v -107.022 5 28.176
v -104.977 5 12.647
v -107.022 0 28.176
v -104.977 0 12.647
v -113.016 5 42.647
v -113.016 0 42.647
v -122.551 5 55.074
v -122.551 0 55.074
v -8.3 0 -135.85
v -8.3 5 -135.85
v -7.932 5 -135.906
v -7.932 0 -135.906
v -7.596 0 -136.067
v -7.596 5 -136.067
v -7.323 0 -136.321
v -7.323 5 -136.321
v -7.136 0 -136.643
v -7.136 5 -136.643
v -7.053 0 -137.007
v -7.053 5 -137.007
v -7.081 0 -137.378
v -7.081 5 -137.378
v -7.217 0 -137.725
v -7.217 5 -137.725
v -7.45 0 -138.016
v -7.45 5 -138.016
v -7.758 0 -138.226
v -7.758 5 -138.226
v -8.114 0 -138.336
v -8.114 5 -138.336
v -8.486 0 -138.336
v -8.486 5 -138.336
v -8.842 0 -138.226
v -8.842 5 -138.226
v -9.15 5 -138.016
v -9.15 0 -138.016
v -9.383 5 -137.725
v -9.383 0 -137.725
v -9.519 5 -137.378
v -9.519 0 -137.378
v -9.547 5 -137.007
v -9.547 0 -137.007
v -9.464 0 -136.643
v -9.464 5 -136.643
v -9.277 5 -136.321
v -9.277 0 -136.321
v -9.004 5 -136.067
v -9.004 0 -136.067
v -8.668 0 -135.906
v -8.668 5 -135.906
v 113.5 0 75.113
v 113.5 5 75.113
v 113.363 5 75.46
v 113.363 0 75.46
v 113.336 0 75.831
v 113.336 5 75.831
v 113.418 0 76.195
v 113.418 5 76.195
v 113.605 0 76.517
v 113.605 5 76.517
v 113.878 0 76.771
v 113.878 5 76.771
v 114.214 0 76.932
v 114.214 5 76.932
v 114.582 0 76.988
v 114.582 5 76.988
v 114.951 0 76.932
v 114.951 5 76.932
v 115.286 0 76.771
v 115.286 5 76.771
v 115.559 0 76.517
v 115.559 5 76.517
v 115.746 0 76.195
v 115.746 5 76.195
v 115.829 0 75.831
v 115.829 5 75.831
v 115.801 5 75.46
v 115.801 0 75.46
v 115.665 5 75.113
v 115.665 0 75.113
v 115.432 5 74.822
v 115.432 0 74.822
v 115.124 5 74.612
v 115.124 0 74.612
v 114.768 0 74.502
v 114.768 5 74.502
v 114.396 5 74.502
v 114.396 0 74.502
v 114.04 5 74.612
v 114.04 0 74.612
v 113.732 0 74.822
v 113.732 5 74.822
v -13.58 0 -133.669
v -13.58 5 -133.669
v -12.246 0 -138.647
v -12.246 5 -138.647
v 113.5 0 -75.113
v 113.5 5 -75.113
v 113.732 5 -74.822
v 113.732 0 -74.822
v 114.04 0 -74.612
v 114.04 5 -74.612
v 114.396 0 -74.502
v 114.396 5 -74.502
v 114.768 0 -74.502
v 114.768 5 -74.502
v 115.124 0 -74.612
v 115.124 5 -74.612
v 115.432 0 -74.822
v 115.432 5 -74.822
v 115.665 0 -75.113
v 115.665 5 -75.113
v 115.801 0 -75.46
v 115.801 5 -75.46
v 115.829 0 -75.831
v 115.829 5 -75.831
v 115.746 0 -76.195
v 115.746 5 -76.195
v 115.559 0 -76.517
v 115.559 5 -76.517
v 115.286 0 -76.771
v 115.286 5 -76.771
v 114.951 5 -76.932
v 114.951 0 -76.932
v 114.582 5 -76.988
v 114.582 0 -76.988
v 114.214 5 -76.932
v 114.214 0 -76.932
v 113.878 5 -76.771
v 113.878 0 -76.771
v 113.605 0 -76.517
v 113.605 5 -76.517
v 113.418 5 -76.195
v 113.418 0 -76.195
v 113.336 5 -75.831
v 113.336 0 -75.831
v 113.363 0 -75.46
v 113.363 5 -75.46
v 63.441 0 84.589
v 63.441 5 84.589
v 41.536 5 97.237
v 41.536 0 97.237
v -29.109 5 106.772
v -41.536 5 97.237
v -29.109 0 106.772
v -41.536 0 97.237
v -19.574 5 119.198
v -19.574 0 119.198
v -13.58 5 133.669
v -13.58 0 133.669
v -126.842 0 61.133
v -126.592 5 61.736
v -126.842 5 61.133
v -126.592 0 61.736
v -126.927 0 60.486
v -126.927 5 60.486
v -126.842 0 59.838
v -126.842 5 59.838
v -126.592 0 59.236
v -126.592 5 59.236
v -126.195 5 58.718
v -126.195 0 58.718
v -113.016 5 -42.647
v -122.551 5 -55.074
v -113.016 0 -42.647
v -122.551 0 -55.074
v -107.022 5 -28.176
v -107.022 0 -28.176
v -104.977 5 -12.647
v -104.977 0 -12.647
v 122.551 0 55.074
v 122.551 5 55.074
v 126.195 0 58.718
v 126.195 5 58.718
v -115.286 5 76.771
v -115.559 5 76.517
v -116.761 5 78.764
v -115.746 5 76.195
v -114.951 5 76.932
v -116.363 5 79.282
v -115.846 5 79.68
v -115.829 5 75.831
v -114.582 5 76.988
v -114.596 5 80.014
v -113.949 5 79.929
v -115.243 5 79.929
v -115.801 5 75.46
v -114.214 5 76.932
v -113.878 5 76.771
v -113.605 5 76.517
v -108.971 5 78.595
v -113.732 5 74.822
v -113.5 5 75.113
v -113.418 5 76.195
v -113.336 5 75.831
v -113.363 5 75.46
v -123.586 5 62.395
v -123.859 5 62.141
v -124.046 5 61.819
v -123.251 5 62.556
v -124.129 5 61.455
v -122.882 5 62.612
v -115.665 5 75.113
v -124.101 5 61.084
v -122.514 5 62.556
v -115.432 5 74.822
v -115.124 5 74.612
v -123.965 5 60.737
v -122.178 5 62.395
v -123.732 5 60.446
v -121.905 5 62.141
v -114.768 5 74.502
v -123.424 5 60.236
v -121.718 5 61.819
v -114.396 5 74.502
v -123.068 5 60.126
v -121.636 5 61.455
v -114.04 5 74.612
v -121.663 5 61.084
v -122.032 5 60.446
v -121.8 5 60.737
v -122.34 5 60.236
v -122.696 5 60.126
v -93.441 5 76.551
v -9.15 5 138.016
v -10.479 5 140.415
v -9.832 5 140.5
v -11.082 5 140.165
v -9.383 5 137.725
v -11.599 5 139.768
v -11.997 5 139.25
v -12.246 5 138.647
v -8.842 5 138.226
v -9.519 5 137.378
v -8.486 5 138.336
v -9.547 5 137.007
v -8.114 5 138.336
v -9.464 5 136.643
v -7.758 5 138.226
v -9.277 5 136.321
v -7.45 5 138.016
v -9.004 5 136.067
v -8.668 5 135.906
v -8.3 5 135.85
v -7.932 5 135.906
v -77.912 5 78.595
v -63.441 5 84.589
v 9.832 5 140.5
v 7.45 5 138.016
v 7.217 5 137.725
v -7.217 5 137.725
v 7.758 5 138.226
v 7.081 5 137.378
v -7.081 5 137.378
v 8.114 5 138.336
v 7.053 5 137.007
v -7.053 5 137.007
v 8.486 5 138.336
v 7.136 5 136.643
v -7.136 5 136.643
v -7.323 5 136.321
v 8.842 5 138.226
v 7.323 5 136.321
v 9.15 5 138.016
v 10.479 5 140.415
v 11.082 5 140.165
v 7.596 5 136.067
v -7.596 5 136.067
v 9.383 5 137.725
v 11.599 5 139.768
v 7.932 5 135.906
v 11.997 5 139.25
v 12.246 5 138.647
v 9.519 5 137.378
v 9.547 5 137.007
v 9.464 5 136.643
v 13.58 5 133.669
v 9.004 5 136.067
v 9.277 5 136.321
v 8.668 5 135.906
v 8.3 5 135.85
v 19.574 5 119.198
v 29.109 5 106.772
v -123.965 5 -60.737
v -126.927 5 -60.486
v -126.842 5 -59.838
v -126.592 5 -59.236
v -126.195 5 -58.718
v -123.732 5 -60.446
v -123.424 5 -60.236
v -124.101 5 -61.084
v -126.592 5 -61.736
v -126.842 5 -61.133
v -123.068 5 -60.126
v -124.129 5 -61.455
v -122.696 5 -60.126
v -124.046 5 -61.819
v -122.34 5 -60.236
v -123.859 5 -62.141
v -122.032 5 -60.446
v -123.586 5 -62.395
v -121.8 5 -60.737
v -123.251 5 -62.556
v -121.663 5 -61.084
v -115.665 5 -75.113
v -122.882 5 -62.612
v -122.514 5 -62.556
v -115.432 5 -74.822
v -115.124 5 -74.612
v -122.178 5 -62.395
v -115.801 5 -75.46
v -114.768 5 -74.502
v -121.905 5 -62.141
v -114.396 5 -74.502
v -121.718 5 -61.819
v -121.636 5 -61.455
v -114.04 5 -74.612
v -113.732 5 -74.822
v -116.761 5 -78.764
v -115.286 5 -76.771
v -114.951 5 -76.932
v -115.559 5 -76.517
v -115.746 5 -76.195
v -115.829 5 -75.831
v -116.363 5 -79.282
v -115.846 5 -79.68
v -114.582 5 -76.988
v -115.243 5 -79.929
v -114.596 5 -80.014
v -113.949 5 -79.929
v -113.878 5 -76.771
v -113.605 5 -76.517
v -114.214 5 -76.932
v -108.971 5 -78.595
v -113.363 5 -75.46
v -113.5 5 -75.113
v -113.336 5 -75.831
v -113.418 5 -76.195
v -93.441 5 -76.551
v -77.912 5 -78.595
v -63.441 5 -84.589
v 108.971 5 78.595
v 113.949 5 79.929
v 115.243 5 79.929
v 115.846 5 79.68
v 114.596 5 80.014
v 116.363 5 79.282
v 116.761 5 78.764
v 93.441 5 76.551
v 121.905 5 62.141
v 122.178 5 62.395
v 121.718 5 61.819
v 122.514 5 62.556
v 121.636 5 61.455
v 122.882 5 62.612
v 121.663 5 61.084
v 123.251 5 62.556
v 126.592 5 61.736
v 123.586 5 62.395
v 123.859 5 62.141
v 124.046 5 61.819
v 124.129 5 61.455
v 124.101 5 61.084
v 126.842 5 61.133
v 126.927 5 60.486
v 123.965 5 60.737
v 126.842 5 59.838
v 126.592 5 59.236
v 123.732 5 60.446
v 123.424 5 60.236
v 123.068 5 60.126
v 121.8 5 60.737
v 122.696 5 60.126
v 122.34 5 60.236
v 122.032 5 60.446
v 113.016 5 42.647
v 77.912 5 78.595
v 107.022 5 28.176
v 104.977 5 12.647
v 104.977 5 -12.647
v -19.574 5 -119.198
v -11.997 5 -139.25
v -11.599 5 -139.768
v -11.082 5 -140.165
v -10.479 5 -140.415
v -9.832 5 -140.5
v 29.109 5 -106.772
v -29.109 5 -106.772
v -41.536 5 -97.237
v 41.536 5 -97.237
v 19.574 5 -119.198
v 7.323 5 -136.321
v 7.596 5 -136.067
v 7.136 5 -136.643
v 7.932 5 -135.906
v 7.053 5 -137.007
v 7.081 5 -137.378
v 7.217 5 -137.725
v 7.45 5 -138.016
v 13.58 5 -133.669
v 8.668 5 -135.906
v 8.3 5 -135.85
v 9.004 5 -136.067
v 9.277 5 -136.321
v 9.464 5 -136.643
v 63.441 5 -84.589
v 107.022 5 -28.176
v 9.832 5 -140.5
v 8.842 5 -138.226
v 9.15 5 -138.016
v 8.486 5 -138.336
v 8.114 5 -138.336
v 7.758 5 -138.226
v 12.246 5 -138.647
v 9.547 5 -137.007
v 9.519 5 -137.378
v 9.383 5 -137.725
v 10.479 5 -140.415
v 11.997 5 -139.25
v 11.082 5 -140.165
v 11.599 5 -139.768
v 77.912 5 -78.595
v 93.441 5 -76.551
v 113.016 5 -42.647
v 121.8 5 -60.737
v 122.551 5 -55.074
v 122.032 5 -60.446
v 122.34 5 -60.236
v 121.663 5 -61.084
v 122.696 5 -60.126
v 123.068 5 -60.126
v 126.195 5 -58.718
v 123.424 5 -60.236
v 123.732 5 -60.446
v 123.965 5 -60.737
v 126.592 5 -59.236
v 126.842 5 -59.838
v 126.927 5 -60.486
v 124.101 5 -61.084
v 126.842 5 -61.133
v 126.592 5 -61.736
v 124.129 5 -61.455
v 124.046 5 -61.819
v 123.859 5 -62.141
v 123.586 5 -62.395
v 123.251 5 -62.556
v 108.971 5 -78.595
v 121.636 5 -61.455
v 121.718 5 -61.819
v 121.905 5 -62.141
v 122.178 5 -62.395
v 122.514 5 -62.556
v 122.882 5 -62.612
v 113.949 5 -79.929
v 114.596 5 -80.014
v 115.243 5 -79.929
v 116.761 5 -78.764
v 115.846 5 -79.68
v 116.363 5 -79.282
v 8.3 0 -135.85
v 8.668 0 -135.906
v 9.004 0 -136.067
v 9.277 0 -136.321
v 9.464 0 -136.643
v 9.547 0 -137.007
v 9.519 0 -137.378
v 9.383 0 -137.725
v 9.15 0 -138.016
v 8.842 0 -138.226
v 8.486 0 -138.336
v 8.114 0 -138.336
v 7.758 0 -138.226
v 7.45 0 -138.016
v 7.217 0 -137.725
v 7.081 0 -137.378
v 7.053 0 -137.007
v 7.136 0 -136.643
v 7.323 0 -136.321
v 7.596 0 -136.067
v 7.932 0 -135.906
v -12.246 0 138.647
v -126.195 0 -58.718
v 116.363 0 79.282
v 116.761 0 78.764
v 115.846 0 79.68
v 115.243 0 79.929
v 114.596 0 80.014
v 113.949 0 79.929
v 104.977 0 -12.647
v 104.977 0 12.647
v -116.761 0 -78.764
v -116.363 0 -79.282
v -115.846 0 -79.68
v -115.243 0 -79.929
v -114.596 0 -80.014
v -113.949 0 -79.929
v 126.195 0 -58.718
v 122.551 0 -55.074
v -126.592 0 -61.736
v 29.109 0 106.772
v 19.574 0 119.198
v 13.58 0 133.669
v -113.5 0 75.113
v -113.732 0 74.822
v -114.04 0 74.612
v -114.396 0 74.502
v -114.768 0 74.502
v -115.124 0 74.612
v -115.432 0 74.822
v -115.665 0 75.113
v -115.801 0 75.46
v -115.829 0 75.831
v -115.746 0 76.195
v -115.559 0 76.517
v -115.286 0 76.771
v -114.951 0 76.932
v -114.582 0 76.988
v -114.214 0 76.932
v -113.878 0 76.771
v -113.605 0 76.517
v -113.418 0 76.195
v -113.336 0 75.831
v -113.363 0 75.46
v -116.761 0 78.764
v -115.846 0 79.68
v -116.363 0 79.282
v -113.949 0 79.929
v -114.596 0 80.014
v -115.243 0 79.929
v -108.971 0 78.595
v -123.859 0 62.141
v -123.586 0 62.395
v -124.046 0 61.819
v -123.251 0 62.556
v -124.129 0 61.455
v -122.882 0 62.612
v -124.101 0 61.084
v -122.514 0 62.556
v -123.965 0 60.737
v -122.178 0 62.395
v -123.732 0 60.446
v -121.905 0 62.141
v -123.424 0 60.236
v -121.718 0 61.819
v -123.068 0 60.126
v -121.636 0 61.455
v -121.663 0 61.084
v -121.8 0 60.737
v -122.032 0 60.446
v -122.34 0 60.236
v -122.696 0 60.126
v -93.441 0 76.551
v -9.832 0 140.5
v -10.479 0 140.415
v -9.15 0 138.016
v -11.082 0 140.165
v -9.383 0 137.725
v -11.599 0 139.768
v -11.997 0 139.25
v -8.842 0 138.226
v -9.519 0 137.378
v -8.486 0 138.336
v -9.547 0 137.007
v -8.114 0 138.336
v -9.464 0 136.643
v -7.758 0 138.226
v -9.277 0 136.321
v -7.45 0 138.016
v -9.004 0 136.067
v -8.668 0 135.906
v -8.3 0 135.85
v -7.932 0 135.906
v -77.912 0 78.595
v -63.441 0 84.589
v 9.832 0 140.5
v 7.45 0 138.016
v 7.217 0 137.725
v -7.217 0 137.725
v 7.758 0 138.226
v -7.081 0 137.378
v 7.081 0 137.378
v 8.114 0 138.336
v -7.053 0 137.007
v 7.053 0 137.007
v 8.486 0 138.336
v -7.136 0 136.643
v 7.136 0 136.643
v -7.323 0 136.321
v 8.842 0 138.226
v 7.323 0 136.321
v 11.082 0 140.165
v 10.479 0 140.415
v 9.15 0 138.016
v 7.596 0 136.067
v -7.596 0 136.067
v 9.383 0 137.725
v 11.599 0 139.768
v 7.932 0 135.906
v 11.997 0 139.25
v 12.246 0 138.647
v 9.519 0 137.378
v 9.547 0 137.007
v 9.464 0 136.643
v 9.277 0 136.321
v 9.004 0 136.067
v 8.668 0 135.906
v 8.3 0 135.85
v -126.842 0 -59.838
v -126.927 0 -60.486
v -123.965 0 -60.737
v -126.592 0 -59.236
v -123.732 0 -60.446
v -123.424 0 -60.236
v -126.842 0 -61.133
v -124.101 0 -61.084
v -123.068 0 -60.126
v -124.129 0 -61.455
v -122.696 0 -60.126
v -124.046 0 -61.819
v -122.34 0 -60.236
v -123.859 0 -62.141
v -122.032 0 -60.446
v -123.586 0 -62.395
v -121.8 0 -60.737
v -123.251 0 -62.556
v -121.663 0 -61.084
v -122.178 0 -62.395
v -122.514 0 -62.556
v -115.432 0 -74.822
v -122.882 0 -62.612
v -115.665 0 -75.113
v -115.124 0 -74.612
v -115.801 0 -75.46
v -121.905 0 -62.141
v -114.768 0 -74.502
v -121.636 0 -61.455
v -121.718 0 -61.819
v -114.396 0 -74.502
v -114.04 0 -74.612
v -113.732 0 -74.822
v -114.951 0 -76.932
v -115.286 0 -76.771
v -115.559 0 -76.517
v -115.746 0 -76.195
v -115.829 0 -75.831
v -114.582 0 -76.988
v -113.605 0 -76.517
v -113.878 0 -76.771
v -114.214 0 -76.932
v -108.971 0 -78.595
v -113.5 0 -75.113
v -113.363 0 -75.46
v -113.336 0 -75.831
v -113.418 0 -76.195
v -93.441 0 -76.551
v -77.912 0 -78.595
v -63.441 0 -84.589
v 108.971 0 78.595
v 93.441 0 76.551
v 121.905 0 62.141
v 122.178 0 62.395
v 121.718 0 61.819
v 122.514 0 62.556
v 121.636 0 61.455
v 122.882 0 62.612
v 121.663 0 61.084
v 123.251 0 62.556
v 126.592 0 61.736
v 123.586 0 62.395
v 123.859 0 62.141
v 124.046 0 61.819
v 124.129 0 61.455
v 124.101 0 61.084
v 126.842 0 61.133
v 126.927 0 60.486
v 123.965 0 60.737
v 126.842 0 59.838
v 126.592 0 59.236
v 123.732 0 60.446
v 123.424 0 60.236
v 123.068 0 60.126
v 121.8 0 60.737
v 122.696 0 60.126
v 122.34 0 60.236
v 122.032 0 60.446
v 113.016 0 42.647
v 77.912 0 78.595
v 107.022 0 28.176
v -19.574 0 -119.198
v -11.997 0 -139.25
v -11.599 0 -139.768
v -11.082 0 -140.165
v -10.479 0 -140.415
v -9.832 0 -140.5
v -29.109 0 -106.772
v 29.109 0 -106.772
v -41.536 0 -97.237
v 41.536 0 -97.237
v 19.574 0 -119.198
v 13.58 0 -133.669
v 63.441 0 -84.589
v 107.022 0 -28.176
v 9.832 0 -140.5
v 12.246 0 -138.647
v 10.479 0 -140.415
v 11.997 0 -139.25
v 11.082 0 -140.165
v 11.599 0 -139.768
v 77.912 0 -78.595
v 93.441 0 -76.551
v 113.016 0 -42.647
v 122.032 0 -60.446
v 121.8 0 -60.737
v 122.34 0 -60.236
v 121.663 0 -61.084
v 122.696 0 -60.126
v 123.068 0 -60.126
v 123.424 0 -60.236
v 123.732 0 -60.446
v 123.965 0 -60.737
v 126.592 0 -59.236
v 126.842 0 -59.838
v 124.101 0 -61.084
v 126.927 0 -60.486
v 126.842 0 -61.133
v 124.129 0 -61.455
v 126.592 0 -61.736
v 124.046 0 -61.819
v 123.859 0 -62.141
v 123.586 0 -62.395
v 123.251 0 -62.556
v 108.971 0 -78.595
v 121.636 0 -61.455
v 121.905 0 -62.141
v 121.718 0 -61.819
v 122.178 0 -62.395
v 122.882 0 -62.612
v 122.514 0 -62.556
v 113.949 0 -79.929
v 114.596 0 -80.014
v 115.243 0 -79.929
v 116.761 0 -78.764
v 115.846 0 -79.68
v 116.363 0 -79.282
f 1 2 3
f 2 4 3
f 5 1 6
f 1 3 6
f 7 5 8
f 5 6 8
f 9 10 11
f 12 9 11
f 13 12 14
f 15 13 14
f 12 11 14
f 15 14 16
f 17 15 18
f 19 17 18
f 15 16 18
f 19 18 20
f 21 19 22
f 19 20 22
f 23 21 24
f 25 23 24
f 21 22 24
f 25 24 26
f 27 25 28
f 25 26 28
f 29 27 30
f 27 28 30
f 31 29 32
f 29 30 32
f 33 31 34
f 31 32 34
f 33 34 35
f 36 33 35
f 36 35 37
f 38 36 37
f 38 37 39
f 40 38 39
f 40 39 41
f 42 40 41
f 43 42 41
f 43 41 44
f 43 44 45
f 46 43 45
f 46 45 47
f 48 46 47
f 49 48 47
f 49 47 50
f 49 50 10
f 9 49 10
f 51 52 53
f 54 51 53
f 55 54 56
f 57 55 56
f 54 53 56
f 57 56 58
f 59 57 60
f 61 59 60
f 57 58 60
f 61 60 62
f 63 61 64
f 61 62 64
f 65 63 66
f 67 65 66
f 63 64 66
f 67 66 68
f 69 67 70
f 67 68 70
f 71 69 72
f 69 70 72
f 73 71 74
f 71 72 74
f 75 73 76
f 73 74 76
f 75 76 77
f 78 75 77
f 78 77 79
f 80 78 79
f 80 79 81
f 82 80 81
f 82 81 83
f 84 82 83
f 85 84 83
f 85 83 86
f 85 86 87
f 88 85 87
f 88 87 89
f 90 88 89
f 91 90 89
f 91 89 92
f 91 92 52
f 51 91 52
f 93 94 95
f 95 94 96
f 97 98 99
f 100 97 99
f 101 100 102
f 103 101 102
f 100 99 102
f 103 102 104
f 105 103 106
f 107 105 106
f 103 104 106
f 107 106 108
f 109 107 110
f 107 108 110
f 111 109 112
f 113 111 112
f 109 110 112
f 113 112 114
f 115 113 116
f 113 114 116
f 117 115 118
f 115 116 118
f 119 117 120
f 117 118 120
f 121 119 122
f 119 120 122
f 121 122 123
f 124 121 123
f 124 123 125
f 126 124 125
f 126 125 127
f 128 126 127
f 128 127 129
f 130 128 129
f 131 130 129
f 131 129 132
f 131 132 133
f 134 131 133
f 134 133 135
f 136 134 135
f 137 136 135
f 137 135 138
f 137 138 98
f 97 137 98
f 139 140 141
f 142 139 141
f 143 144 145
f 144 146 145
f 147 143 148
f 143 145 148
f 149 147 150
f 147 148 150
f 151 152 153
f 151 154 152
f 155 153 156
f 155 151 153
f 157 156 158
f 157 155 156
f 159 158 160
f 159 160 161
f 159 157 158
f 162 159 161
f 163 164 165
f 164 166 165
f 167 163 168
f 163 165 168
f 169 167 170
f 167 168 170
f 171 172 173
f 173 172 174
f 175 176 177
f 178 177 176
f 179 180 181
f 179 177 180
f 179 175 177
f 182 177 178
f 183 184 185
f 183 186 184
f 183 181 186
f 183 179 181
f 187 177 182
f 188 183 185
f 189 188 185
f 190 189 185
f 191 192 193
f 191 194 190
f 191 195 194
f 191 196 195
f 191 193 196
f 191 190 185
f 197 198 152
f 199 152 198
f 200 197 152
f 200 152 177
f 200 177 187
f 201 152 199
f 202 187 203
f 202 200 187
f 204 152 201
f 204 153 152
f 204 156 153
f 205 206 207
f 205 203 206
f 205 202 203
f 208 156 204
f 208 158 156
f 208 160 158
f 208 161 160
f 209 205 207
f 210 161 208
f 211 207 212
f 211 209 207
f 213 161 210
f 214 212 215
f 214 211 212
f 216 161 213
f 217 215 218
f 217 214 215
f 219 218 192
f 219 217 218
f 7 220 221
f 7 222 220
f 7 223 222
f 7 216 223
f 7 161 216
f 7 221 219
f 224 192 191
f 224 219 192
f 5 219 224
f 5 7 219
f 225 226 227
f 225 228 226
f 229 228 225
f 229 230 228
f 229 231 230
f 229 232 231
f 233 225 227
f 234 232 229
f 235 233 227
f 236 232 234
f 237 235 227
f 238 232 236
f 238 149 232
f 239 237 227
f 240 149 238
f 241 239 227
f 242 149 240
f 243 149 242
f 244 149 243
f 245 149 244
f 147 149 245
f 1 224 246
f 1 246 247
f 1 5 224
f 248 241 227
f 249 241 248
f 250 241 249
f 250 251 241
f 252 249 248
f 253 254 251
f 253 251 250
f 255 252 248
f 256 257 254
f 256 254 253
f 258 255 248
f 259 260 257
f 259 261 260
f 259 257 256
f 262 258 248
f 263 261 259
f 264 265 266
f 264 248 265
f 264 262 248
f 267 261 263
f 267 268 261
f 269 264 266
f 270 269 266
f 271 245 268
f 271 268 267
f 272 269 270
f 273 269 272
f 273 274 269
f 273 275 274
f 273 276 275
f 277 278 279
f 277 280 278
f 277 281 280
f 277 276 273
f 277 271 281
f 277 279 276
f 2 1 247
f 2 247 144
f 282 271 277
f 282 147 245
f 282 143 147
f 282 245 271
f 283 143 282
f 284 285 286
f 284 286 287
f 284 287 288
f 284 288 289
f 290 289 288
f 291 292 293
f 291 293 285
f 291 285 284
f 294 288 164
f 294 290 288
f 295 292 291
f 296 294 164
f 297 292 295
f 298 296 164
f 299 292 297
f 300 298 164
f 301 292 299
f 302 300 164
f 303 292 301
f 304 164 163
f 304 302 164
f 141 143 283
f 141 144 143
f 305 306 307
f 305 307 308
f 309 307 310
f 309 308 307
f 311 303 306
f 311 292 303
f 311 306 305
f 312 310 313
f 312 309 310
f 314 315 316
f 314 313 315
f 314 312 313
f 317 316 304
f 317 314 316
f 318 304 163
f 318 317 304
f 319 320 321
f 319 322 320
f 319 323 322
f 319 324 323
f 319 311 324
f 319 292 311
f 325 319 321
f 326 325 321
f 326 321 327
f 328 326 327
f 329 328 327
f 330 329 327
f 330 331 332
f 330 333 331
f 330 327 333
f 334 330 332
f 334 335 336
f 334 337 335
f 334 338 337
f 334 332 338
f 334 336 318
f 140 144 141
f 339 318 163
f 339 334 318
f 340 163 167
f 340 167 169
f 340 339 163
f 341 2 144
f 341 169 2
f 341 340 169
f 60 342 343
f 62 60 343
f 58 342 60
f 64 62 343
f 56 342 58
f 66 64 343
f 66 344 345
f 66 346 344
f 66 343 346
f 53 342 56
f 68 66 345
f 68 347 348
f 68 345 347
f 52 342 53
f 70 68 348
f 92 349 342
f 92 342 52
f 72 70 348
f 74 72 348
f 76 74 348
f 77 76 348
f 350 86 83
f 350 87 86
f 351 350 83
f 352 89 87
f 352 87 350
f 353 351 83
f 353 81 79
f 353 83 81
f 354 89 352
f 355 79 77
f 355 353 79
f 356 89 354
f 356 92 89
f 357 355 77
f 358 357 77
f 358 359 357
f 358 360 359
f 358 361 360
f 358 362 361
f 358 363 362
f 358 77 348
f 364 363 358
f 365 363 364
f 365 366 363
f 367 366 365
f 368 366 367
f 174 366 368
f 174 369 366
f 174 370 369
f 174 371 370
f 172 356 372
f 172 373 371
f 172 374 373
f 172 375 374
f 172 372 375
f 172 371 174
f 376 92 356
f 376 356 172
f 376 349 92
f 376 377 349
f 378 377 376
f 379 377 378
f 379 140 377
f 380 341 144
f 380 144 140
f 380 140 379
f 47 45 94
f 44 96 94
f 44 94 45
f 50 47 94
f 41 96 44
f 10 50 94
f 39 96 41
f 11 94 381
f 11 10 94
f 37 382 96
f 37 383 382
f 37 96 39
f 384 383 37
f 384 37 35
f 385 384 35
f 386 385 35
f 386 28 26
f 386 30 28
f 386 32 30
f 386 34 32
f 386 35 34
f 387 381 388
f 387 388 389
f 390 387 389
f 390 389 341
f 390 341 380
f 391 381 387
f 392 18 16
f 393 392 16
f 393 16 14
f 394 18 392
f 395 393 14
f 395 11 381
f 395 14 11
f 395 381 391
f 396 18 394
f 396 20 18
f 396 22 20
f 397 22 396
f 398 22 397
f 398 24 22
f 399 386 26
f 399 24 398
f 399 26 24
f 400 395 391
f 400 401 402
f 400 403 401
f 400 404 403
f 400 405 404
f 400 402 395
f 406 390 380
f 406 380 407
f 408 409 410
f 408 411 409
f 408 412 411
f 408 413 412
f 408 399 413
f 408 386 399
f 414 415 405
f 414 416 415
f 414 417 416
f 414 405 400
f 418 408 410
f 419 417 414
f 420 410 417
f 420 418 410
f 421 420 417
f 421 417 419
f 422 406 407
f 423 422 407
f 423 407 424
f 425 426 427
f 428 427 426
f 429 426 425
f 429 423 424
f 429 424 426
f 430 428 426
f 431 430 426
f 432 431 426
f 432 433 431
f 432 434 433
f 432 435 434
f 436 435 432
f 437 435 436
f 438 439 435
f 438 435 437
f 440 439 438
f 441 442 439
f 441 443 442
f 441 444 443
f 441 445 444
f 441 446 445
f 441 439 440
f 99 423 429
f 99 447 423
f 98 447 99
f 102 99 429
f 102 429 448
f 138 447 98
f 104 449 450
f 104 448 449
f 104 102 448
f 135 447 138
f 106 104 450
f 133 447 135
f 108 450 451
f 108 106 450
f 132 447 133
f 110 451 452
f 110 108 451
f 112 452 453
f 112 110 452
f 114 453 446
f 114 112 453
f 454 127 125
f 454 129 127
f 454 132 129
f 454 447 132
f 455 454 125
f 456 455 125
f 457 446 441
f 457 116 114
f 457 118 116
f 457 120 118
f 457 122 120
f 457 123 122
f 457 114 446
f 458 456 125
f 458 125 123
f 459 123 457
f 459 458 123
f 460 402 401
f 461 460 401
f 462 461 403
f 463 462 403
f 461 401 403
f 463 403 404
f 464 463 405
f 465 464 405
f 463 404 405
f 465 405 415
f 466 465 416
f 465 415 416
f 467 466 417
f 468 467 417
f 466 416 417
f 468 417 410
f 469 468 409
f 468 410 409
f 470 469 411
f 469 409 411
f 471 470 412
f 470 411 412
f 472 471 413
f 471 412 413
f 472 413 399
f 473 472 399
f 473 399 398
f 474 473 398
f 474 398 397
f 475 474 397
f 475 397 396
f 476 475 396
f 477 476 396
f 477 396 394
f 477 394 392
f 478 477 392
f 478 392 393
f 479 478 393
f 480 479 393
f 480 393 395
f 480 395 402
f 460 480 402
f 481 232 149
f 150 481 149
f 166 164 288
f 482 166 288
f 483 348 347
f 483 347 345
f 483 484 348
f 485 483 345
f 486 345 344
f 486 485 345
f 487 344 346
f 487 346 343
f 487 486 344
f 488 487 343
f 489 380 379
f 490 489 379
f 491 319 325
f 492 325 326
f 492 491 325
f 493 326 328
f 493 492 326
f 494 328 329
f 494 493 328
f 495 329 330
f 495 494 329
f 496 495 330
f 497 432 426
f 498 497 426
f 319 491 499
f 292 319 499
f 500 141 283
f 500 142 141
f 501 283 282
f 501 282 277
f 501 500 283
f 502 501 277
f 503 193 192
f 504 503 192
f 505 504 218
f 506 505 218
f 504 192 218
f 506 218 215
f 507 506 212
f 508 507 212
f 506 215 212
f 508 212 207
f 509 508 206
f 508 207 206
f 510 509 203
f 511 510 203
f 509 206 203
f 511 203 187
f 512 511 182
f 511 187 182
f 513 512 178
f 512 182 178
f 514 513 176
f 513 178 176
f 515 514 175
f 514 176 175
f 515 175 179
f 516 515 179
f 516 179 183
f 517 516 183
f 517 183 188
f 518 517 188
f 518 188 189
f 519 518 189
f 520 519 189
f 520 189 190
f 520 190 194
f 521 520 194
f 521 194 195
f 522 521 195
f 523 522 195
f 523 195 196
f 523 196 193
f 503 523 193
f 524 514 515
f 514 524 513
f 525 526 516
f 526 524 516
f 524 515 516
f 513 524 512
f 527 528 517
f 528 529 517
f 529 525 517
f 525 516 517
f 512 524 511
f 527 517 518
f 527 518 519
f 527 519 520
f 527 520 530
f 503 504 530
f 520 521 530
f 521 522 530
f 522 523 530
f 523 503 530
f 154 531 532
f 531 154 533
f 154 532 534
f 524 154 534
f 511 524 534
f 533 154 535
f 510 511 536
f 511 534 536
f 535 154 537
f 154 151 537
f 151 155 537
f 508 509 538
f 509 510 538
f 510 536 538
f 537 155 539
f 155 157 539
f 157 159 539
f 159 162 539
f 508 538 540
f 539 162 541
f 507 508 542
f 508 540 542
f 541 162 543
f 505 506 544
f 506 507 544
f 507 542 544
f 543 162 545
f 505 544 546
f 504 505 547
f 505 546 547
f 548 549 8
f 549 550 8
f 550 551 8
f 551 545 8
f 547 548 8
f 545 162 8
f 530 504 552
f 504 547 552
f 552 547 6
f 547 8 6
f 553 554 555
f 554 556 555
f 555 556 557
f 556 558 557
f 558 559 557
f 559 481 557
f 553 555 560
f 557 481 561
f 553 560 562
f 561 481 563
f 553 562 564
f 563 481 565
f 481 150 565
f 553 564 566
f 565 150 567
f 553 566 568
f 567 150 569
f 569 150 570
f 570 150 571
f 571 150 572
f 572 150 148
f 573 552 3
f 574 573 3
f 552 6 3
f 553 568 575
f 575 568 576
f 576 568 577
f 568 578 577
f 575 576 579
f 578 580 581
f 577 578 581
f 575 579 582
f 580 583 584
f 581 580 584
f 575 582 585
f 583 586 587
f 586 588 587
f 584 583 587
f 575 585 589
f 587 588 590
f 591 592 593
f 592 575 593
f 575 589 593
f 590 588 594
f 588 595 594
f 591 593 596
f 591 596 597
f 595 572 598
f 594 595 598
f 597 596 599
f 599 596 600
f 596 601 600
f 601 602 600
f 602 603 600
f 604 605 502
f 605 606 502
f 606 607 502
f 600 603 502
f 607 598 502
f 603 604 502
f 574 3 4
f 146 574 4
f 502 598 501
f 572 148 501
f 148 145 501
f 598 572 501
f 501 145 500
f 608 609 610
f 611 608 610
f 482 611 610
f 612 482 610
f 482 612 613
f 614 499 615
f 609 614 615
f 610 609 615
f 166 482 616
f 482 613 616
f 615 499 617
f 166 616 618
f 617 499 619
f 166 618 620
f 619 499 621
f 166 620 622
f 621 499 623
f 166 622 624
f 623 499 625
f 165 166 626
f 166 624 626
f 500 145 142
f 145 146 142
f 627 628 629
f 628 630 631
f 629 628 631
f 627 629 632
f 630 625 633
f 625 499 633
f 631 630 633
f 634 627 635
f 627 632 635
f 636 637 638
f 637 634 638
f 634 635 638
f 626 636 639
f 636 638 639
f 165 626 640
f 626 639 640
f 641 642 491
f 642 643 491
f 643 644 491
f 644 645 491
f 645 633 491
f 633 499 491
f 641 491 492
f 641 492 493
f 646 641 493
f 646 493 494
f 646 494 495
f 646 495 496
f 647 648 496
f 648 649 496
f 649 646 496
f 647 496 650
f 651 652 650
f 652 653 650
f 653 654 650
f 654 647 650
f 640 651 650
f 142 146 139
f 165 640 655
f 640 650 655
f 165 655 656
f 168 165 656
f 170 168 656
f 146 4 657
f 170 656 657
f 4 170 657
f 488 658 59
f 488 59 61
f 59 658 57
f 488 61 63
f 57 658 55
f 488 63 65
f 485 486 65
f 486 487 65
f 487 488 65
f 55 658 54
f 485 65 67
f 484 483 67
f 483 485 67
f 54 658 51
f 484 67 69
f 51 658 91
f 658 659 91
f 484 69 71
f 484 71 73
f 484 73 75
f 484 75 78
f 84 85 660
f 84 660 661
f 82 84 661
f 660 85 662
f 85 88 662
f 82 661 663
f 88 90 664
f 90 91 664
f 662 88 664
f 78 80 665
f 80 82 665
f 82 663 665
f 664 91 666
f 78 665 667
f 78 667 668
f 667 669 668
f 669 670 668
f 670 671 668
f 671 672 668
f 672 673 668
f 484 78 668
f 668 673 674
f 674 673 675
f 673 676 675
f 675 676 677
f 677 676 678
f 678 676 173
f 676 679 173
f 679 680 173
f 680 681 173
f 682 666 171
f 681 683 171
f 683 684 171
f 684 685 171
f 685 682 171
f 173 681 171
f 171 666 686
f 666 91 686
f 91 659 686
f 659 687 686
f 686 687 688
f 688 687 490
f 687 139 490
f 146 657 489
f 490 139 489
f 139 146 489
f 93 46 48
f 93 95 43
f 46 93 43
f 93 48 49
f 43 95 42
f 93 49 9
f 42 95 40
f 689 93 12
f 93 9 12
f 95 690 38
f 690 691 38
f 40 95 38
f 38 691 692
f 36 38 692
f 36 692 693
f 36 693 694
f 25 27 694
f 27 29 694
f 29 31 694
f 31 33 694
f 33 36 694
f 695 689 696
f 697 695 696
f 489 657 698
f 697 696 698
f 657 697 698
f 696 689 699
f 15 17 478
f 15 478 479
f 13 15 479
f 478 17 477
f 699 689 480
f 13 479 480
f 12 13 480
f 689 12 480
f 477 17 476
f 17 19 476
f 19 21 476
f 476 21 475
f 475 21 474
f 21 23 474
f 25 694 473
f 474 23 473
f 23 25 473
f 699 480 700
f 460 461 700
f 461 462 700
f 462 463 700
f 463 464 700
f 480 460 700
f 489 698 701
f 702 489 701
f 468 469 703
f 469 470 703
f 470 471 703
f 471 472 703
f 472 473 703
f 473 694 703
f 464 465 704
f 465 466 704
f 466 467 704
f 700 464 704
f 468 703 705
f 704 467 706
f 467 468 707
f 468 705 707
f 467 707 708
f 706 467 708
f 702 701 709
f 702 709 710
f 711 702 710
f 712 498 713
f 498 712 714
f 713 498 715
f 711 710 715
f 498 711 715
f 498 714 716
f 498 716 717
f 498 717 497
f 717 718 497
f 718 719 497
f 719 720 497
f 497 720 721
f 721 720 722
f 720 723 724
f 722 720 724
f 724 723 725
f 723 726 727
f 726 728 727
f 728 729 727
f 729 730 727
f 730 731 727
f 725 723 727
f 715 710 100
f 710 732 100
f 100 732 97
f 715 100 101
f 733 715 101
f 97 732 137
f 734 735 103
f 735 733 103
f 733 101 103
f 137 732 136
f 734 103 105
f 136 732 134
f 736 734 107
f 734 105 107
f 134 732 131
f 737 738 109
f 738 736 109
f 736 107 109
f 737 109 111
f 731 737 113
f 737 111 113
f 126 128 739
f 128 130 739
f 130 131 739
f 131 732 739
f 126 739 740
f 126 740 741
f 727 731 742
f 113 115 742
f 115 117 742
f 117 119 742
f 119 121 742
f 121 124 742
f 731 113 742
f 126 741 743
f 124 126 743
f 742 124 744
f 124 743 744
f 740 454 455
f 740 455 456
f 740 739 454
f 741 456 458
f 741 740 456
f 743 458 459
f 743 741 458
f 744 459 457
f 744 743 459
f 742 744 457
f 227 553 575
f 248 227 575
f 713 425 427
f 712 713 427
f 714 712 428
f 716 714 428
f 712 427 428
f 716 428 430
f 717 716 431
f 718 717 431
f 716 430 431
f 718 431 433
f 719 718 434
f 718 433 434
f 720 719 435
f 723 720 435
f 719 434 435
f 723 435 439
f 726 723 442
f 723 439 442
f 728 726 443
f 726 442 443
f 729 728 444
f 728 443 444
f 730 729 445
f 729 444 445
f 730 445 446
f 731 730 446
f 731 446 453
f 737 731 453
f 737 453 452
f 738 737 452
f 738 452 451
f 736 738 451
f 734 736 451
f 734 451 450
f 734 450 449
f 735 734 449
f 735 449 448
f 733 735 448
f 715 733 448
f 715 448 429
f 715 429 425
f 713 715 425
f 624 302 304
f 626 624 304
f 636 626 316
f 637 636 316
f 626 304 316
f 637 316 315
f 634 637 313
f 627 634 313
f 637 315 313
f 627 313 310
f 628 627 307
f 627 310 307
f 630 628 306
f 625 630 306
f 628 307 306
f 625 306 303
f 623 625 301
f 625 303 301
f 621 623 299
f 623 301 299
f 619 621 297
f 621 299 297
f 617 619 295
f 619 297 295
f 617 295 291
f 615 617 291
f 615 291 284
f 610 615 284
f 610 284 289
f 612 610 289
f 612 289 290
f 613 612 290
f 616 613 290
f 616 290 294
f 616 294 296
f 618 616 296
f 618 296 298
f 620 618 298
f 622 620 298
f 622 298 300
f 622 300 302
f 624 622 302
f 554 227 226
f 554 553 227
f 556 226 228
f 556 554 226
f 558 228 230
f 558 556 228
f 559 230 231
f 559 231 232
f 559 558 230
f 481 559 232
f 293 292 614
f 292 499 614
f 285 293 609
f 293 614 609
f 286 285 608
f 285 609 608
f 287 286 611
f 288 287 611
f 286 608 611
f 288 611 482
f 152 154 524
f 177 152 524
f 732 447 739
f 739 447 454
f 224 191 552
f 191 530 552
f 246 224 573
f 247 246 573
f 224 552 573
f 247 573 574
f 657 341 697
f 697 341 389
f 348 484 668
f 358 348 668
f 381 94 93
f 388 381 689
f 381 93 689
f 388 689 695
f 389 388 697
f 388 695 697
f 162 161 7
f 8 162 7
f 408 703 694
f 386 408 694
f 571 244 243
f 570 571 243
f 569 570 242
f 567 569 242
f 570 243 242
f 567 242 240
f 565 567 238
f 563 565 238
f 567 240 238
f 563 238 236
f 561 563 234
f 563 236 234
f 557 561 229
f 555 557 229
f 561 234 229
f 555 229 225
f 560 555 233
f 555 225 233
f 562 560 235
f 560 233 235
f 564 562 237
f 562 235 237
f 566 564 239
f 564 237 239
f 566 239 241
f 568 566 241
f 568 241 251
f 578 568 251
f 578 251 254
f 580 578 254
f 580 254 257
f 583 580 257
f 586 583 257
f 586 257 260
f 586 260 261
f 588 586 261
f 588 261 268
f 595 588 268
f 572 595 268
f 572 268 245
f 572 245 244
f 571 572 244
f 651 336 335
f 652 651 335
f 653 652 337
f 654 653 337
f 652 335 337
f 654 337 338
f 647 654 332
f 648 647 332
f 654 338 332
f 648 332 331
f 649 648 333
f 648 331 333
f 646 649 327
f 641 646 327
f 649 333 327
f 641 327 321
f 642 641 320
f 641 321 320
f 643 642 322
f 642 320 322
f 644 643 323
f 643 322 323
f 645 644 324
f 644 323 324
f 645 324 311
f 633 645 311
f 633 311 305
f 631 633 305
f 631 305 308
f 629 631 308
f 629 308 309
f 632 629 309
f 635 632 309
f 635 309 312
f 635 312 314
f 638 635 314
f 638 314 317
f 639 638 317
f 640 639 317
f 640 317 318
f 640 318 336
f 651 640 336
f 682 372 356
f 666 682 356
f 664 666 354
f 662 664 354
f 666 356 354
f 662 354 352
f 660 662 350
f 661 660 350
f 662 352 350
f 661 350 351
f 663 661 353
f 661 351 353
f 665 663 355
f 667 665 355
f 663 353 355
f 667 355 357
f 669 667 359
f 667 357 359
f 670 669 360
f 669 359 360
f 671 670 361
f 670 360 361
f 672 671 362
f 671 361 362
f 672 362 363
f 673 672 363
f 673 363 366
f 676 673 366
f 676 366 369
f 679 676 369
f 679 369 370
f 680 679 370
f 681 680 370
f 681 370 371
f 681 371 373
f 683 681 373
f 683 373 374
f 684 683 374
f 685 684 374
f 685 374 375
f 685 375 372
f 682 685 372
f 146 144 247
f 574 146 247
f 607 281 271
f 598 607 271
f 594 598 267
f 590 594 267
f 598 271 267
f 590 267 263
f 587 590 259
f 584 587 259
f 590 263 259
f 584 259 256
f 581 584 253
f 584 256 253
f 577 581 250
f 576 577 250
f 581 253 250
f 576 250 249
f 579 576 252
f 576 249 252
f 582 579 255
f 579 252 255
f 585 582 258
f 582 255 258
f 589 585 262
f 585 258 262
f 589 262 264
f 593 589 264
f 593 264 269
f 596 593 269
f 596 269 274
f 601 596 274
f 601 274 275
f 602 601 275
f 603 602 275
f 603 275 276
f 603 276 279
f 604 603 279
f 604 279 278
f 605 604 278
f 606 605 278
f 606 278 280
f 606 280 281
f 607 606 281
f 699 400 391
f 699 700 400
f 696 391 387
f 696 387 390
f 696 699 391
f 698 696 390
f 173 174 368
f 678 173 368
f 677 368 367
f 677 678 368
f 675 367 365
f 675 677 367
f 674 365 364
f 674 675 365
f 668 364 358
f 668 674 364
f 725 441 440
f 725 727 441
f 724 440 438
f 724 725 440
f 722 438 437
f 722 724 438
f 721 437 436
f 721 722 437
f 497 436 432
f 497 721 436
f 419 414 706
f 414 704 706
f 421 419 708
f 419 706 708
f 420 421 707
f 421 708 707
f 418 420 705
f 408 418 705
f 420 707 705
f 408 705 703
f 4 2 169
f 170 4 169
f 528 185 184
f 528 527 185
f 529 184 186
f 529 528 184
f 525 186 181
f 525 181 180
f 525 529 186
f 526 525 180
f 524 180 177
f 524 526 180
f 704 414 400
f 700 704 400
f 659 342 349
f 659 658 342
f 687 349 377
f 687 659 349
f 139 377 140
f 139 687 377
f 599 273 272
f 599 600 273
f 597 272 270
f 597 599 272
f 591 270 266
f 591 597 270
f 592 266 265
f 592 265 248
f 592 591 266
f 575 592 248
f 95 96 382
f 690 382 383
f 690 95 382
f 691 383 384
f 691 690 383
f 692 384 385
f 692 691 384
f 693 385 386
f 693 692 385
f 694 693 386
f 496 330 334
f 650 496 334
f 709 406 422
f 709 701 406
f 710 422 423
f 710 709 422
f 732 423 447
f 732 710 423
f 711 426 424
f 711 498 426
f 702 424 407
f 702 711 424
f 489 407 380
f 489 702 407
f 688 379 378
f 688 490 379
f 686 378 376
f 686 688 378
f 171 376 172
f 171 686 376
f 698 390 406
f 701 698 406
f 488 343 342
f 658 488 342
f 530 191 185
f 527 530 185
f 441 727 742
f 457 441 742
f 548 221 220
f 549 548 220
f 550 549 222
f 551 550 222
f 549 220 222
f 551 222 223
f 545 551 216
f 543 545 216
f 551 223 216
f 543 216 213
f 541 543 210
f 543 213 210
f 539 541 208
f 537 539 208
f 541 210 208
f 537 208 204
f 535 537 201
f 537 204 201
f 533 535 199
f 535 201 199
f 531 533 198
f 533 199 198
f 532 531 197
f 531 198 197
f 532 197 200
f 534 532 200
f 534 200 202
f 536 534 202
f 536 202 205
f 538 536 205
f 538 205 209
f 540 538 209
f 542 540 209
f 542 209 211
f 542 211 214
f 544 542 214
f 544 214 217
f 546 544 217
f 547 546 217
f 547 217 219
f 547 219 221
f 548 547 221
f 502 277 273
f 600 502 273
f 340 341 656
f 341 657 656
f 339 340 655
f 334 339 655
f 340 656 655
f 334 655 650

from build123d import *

# Parameters (mm, degrees)
BOSS_EXTRUDE1_DEPTH = 5
SKETCH3_R           = 1.25
CUT_EXTRUDE1_DEPTH  = 215.675530355
CIRPATTERN2_COUNT   = 6
FILLET3_R           = 2.5
FILLET4_R           = 60


with BuildPart() as part:
    # Sketch1 → Boss-Extrude1 (new body)
    with BuildSketch(Plane(origin=(0, 0, 0), x_dir=(1, 0, 0), z_dir=(0, 1, 0))):
        Polygon((-81.117712821, 140.5), (-162.235425642, 0), (-81.117712821, -140.5), (81.117712821, -140.5), (162.235425642, 0), (81.117712821, 140.5), align=None)
    extrude(amount=BOSS_EXTRUDE1_DEPTH)

    # Sketch3 → Cut-Extrude1 (cut, through all)
    with BuildSketch(Plane(origin=(0, 5, 0), x_dir=(1, 0, 0), z_dir=(0, 1, 0))):
        with Locations((8.3, 137.1)):
            Circle(SKETCH3_R)
        with Locations((-8.3, 137.1)):
            Circle(SKETCH3_R)
        Polygon((11.75, 140.5), (20.012731221, 109.663067273), (84.964636505, 72.163067273), (115.801569232, 80.425798494), (81.117712821, 140.5), align=None)
    cut_extrude1 = extrude(amount=-CUT_EXTRUDE1_DEPTH, mode=Mode.SUBTRACT)

    # CirPattern2: Cut-Extrude1 ×6 about axis
    cirpattern2_axis = Axis((0, 0, 0), (0, 1, 0))
    for i in range(1, CIRPATTERN2_COUNT):
        add(cut_extrude1.rotate(cirpattern2_axis, i * 360 / CIRPATTERN2_COUNT), mode=Mode.SUBTRACT)

    # Fillet3
    fillet3_edges = [part.edges().sort_by_distance(p)[0] for p in [
        (115.801569232, 2.5, -80.425798494),
        (11.75, 2.5, -140.5),
        (127.551569232, 2.5, -60.074201506),
        (127.551569232, 2.5, 60.074201506),
        (115.801569232, 2.5, 80.425798494),
        (11.75, 2.5, 140.5),
        (-11.75, 2.5, 140.5),
        (-115.801569232, 2.5, 80.425798494),
        (-127.551569232, 2.5, 60.074201506),
        (-127.551569232, 2.5, -60.074201506),
        (-115.801569232, 2.5, -80.425798494),
        (-11.75, 2.5, -140.5),
    ]]
    fillet(fillet3_edges, radius=FILLET3_R)

    # Fillet4
    fillet4_edges = [part.edges().sort_by_distance(p)[0] for p in [
        (84.964636505, 2.5, -72.163067273),
        (20.012731221, 2.5, -109.663067273),
        (-20.012731221, 2.5, -109.663067273),
        (-84.964636505, 2.5, -72.163067273),
        (-104.977367726, 2.5, -37.5),
        (-104.977367726, 2.5, 37.5),
        (-84.964636505, 2.5, 72.163067273),
        (-20.012731221, 2.5, 109.663067273),
        (20.012731221, 2.5, 109.663067273),
        (84.964636505, 2.5, 72.163067273),
        (104.977367726, 2.5, 37.5),
        (104.977367726, 2.5, -37.5),
    ]]
    fillet(fillet4_edges, radius=FILLET4_R)


solid = part.part
